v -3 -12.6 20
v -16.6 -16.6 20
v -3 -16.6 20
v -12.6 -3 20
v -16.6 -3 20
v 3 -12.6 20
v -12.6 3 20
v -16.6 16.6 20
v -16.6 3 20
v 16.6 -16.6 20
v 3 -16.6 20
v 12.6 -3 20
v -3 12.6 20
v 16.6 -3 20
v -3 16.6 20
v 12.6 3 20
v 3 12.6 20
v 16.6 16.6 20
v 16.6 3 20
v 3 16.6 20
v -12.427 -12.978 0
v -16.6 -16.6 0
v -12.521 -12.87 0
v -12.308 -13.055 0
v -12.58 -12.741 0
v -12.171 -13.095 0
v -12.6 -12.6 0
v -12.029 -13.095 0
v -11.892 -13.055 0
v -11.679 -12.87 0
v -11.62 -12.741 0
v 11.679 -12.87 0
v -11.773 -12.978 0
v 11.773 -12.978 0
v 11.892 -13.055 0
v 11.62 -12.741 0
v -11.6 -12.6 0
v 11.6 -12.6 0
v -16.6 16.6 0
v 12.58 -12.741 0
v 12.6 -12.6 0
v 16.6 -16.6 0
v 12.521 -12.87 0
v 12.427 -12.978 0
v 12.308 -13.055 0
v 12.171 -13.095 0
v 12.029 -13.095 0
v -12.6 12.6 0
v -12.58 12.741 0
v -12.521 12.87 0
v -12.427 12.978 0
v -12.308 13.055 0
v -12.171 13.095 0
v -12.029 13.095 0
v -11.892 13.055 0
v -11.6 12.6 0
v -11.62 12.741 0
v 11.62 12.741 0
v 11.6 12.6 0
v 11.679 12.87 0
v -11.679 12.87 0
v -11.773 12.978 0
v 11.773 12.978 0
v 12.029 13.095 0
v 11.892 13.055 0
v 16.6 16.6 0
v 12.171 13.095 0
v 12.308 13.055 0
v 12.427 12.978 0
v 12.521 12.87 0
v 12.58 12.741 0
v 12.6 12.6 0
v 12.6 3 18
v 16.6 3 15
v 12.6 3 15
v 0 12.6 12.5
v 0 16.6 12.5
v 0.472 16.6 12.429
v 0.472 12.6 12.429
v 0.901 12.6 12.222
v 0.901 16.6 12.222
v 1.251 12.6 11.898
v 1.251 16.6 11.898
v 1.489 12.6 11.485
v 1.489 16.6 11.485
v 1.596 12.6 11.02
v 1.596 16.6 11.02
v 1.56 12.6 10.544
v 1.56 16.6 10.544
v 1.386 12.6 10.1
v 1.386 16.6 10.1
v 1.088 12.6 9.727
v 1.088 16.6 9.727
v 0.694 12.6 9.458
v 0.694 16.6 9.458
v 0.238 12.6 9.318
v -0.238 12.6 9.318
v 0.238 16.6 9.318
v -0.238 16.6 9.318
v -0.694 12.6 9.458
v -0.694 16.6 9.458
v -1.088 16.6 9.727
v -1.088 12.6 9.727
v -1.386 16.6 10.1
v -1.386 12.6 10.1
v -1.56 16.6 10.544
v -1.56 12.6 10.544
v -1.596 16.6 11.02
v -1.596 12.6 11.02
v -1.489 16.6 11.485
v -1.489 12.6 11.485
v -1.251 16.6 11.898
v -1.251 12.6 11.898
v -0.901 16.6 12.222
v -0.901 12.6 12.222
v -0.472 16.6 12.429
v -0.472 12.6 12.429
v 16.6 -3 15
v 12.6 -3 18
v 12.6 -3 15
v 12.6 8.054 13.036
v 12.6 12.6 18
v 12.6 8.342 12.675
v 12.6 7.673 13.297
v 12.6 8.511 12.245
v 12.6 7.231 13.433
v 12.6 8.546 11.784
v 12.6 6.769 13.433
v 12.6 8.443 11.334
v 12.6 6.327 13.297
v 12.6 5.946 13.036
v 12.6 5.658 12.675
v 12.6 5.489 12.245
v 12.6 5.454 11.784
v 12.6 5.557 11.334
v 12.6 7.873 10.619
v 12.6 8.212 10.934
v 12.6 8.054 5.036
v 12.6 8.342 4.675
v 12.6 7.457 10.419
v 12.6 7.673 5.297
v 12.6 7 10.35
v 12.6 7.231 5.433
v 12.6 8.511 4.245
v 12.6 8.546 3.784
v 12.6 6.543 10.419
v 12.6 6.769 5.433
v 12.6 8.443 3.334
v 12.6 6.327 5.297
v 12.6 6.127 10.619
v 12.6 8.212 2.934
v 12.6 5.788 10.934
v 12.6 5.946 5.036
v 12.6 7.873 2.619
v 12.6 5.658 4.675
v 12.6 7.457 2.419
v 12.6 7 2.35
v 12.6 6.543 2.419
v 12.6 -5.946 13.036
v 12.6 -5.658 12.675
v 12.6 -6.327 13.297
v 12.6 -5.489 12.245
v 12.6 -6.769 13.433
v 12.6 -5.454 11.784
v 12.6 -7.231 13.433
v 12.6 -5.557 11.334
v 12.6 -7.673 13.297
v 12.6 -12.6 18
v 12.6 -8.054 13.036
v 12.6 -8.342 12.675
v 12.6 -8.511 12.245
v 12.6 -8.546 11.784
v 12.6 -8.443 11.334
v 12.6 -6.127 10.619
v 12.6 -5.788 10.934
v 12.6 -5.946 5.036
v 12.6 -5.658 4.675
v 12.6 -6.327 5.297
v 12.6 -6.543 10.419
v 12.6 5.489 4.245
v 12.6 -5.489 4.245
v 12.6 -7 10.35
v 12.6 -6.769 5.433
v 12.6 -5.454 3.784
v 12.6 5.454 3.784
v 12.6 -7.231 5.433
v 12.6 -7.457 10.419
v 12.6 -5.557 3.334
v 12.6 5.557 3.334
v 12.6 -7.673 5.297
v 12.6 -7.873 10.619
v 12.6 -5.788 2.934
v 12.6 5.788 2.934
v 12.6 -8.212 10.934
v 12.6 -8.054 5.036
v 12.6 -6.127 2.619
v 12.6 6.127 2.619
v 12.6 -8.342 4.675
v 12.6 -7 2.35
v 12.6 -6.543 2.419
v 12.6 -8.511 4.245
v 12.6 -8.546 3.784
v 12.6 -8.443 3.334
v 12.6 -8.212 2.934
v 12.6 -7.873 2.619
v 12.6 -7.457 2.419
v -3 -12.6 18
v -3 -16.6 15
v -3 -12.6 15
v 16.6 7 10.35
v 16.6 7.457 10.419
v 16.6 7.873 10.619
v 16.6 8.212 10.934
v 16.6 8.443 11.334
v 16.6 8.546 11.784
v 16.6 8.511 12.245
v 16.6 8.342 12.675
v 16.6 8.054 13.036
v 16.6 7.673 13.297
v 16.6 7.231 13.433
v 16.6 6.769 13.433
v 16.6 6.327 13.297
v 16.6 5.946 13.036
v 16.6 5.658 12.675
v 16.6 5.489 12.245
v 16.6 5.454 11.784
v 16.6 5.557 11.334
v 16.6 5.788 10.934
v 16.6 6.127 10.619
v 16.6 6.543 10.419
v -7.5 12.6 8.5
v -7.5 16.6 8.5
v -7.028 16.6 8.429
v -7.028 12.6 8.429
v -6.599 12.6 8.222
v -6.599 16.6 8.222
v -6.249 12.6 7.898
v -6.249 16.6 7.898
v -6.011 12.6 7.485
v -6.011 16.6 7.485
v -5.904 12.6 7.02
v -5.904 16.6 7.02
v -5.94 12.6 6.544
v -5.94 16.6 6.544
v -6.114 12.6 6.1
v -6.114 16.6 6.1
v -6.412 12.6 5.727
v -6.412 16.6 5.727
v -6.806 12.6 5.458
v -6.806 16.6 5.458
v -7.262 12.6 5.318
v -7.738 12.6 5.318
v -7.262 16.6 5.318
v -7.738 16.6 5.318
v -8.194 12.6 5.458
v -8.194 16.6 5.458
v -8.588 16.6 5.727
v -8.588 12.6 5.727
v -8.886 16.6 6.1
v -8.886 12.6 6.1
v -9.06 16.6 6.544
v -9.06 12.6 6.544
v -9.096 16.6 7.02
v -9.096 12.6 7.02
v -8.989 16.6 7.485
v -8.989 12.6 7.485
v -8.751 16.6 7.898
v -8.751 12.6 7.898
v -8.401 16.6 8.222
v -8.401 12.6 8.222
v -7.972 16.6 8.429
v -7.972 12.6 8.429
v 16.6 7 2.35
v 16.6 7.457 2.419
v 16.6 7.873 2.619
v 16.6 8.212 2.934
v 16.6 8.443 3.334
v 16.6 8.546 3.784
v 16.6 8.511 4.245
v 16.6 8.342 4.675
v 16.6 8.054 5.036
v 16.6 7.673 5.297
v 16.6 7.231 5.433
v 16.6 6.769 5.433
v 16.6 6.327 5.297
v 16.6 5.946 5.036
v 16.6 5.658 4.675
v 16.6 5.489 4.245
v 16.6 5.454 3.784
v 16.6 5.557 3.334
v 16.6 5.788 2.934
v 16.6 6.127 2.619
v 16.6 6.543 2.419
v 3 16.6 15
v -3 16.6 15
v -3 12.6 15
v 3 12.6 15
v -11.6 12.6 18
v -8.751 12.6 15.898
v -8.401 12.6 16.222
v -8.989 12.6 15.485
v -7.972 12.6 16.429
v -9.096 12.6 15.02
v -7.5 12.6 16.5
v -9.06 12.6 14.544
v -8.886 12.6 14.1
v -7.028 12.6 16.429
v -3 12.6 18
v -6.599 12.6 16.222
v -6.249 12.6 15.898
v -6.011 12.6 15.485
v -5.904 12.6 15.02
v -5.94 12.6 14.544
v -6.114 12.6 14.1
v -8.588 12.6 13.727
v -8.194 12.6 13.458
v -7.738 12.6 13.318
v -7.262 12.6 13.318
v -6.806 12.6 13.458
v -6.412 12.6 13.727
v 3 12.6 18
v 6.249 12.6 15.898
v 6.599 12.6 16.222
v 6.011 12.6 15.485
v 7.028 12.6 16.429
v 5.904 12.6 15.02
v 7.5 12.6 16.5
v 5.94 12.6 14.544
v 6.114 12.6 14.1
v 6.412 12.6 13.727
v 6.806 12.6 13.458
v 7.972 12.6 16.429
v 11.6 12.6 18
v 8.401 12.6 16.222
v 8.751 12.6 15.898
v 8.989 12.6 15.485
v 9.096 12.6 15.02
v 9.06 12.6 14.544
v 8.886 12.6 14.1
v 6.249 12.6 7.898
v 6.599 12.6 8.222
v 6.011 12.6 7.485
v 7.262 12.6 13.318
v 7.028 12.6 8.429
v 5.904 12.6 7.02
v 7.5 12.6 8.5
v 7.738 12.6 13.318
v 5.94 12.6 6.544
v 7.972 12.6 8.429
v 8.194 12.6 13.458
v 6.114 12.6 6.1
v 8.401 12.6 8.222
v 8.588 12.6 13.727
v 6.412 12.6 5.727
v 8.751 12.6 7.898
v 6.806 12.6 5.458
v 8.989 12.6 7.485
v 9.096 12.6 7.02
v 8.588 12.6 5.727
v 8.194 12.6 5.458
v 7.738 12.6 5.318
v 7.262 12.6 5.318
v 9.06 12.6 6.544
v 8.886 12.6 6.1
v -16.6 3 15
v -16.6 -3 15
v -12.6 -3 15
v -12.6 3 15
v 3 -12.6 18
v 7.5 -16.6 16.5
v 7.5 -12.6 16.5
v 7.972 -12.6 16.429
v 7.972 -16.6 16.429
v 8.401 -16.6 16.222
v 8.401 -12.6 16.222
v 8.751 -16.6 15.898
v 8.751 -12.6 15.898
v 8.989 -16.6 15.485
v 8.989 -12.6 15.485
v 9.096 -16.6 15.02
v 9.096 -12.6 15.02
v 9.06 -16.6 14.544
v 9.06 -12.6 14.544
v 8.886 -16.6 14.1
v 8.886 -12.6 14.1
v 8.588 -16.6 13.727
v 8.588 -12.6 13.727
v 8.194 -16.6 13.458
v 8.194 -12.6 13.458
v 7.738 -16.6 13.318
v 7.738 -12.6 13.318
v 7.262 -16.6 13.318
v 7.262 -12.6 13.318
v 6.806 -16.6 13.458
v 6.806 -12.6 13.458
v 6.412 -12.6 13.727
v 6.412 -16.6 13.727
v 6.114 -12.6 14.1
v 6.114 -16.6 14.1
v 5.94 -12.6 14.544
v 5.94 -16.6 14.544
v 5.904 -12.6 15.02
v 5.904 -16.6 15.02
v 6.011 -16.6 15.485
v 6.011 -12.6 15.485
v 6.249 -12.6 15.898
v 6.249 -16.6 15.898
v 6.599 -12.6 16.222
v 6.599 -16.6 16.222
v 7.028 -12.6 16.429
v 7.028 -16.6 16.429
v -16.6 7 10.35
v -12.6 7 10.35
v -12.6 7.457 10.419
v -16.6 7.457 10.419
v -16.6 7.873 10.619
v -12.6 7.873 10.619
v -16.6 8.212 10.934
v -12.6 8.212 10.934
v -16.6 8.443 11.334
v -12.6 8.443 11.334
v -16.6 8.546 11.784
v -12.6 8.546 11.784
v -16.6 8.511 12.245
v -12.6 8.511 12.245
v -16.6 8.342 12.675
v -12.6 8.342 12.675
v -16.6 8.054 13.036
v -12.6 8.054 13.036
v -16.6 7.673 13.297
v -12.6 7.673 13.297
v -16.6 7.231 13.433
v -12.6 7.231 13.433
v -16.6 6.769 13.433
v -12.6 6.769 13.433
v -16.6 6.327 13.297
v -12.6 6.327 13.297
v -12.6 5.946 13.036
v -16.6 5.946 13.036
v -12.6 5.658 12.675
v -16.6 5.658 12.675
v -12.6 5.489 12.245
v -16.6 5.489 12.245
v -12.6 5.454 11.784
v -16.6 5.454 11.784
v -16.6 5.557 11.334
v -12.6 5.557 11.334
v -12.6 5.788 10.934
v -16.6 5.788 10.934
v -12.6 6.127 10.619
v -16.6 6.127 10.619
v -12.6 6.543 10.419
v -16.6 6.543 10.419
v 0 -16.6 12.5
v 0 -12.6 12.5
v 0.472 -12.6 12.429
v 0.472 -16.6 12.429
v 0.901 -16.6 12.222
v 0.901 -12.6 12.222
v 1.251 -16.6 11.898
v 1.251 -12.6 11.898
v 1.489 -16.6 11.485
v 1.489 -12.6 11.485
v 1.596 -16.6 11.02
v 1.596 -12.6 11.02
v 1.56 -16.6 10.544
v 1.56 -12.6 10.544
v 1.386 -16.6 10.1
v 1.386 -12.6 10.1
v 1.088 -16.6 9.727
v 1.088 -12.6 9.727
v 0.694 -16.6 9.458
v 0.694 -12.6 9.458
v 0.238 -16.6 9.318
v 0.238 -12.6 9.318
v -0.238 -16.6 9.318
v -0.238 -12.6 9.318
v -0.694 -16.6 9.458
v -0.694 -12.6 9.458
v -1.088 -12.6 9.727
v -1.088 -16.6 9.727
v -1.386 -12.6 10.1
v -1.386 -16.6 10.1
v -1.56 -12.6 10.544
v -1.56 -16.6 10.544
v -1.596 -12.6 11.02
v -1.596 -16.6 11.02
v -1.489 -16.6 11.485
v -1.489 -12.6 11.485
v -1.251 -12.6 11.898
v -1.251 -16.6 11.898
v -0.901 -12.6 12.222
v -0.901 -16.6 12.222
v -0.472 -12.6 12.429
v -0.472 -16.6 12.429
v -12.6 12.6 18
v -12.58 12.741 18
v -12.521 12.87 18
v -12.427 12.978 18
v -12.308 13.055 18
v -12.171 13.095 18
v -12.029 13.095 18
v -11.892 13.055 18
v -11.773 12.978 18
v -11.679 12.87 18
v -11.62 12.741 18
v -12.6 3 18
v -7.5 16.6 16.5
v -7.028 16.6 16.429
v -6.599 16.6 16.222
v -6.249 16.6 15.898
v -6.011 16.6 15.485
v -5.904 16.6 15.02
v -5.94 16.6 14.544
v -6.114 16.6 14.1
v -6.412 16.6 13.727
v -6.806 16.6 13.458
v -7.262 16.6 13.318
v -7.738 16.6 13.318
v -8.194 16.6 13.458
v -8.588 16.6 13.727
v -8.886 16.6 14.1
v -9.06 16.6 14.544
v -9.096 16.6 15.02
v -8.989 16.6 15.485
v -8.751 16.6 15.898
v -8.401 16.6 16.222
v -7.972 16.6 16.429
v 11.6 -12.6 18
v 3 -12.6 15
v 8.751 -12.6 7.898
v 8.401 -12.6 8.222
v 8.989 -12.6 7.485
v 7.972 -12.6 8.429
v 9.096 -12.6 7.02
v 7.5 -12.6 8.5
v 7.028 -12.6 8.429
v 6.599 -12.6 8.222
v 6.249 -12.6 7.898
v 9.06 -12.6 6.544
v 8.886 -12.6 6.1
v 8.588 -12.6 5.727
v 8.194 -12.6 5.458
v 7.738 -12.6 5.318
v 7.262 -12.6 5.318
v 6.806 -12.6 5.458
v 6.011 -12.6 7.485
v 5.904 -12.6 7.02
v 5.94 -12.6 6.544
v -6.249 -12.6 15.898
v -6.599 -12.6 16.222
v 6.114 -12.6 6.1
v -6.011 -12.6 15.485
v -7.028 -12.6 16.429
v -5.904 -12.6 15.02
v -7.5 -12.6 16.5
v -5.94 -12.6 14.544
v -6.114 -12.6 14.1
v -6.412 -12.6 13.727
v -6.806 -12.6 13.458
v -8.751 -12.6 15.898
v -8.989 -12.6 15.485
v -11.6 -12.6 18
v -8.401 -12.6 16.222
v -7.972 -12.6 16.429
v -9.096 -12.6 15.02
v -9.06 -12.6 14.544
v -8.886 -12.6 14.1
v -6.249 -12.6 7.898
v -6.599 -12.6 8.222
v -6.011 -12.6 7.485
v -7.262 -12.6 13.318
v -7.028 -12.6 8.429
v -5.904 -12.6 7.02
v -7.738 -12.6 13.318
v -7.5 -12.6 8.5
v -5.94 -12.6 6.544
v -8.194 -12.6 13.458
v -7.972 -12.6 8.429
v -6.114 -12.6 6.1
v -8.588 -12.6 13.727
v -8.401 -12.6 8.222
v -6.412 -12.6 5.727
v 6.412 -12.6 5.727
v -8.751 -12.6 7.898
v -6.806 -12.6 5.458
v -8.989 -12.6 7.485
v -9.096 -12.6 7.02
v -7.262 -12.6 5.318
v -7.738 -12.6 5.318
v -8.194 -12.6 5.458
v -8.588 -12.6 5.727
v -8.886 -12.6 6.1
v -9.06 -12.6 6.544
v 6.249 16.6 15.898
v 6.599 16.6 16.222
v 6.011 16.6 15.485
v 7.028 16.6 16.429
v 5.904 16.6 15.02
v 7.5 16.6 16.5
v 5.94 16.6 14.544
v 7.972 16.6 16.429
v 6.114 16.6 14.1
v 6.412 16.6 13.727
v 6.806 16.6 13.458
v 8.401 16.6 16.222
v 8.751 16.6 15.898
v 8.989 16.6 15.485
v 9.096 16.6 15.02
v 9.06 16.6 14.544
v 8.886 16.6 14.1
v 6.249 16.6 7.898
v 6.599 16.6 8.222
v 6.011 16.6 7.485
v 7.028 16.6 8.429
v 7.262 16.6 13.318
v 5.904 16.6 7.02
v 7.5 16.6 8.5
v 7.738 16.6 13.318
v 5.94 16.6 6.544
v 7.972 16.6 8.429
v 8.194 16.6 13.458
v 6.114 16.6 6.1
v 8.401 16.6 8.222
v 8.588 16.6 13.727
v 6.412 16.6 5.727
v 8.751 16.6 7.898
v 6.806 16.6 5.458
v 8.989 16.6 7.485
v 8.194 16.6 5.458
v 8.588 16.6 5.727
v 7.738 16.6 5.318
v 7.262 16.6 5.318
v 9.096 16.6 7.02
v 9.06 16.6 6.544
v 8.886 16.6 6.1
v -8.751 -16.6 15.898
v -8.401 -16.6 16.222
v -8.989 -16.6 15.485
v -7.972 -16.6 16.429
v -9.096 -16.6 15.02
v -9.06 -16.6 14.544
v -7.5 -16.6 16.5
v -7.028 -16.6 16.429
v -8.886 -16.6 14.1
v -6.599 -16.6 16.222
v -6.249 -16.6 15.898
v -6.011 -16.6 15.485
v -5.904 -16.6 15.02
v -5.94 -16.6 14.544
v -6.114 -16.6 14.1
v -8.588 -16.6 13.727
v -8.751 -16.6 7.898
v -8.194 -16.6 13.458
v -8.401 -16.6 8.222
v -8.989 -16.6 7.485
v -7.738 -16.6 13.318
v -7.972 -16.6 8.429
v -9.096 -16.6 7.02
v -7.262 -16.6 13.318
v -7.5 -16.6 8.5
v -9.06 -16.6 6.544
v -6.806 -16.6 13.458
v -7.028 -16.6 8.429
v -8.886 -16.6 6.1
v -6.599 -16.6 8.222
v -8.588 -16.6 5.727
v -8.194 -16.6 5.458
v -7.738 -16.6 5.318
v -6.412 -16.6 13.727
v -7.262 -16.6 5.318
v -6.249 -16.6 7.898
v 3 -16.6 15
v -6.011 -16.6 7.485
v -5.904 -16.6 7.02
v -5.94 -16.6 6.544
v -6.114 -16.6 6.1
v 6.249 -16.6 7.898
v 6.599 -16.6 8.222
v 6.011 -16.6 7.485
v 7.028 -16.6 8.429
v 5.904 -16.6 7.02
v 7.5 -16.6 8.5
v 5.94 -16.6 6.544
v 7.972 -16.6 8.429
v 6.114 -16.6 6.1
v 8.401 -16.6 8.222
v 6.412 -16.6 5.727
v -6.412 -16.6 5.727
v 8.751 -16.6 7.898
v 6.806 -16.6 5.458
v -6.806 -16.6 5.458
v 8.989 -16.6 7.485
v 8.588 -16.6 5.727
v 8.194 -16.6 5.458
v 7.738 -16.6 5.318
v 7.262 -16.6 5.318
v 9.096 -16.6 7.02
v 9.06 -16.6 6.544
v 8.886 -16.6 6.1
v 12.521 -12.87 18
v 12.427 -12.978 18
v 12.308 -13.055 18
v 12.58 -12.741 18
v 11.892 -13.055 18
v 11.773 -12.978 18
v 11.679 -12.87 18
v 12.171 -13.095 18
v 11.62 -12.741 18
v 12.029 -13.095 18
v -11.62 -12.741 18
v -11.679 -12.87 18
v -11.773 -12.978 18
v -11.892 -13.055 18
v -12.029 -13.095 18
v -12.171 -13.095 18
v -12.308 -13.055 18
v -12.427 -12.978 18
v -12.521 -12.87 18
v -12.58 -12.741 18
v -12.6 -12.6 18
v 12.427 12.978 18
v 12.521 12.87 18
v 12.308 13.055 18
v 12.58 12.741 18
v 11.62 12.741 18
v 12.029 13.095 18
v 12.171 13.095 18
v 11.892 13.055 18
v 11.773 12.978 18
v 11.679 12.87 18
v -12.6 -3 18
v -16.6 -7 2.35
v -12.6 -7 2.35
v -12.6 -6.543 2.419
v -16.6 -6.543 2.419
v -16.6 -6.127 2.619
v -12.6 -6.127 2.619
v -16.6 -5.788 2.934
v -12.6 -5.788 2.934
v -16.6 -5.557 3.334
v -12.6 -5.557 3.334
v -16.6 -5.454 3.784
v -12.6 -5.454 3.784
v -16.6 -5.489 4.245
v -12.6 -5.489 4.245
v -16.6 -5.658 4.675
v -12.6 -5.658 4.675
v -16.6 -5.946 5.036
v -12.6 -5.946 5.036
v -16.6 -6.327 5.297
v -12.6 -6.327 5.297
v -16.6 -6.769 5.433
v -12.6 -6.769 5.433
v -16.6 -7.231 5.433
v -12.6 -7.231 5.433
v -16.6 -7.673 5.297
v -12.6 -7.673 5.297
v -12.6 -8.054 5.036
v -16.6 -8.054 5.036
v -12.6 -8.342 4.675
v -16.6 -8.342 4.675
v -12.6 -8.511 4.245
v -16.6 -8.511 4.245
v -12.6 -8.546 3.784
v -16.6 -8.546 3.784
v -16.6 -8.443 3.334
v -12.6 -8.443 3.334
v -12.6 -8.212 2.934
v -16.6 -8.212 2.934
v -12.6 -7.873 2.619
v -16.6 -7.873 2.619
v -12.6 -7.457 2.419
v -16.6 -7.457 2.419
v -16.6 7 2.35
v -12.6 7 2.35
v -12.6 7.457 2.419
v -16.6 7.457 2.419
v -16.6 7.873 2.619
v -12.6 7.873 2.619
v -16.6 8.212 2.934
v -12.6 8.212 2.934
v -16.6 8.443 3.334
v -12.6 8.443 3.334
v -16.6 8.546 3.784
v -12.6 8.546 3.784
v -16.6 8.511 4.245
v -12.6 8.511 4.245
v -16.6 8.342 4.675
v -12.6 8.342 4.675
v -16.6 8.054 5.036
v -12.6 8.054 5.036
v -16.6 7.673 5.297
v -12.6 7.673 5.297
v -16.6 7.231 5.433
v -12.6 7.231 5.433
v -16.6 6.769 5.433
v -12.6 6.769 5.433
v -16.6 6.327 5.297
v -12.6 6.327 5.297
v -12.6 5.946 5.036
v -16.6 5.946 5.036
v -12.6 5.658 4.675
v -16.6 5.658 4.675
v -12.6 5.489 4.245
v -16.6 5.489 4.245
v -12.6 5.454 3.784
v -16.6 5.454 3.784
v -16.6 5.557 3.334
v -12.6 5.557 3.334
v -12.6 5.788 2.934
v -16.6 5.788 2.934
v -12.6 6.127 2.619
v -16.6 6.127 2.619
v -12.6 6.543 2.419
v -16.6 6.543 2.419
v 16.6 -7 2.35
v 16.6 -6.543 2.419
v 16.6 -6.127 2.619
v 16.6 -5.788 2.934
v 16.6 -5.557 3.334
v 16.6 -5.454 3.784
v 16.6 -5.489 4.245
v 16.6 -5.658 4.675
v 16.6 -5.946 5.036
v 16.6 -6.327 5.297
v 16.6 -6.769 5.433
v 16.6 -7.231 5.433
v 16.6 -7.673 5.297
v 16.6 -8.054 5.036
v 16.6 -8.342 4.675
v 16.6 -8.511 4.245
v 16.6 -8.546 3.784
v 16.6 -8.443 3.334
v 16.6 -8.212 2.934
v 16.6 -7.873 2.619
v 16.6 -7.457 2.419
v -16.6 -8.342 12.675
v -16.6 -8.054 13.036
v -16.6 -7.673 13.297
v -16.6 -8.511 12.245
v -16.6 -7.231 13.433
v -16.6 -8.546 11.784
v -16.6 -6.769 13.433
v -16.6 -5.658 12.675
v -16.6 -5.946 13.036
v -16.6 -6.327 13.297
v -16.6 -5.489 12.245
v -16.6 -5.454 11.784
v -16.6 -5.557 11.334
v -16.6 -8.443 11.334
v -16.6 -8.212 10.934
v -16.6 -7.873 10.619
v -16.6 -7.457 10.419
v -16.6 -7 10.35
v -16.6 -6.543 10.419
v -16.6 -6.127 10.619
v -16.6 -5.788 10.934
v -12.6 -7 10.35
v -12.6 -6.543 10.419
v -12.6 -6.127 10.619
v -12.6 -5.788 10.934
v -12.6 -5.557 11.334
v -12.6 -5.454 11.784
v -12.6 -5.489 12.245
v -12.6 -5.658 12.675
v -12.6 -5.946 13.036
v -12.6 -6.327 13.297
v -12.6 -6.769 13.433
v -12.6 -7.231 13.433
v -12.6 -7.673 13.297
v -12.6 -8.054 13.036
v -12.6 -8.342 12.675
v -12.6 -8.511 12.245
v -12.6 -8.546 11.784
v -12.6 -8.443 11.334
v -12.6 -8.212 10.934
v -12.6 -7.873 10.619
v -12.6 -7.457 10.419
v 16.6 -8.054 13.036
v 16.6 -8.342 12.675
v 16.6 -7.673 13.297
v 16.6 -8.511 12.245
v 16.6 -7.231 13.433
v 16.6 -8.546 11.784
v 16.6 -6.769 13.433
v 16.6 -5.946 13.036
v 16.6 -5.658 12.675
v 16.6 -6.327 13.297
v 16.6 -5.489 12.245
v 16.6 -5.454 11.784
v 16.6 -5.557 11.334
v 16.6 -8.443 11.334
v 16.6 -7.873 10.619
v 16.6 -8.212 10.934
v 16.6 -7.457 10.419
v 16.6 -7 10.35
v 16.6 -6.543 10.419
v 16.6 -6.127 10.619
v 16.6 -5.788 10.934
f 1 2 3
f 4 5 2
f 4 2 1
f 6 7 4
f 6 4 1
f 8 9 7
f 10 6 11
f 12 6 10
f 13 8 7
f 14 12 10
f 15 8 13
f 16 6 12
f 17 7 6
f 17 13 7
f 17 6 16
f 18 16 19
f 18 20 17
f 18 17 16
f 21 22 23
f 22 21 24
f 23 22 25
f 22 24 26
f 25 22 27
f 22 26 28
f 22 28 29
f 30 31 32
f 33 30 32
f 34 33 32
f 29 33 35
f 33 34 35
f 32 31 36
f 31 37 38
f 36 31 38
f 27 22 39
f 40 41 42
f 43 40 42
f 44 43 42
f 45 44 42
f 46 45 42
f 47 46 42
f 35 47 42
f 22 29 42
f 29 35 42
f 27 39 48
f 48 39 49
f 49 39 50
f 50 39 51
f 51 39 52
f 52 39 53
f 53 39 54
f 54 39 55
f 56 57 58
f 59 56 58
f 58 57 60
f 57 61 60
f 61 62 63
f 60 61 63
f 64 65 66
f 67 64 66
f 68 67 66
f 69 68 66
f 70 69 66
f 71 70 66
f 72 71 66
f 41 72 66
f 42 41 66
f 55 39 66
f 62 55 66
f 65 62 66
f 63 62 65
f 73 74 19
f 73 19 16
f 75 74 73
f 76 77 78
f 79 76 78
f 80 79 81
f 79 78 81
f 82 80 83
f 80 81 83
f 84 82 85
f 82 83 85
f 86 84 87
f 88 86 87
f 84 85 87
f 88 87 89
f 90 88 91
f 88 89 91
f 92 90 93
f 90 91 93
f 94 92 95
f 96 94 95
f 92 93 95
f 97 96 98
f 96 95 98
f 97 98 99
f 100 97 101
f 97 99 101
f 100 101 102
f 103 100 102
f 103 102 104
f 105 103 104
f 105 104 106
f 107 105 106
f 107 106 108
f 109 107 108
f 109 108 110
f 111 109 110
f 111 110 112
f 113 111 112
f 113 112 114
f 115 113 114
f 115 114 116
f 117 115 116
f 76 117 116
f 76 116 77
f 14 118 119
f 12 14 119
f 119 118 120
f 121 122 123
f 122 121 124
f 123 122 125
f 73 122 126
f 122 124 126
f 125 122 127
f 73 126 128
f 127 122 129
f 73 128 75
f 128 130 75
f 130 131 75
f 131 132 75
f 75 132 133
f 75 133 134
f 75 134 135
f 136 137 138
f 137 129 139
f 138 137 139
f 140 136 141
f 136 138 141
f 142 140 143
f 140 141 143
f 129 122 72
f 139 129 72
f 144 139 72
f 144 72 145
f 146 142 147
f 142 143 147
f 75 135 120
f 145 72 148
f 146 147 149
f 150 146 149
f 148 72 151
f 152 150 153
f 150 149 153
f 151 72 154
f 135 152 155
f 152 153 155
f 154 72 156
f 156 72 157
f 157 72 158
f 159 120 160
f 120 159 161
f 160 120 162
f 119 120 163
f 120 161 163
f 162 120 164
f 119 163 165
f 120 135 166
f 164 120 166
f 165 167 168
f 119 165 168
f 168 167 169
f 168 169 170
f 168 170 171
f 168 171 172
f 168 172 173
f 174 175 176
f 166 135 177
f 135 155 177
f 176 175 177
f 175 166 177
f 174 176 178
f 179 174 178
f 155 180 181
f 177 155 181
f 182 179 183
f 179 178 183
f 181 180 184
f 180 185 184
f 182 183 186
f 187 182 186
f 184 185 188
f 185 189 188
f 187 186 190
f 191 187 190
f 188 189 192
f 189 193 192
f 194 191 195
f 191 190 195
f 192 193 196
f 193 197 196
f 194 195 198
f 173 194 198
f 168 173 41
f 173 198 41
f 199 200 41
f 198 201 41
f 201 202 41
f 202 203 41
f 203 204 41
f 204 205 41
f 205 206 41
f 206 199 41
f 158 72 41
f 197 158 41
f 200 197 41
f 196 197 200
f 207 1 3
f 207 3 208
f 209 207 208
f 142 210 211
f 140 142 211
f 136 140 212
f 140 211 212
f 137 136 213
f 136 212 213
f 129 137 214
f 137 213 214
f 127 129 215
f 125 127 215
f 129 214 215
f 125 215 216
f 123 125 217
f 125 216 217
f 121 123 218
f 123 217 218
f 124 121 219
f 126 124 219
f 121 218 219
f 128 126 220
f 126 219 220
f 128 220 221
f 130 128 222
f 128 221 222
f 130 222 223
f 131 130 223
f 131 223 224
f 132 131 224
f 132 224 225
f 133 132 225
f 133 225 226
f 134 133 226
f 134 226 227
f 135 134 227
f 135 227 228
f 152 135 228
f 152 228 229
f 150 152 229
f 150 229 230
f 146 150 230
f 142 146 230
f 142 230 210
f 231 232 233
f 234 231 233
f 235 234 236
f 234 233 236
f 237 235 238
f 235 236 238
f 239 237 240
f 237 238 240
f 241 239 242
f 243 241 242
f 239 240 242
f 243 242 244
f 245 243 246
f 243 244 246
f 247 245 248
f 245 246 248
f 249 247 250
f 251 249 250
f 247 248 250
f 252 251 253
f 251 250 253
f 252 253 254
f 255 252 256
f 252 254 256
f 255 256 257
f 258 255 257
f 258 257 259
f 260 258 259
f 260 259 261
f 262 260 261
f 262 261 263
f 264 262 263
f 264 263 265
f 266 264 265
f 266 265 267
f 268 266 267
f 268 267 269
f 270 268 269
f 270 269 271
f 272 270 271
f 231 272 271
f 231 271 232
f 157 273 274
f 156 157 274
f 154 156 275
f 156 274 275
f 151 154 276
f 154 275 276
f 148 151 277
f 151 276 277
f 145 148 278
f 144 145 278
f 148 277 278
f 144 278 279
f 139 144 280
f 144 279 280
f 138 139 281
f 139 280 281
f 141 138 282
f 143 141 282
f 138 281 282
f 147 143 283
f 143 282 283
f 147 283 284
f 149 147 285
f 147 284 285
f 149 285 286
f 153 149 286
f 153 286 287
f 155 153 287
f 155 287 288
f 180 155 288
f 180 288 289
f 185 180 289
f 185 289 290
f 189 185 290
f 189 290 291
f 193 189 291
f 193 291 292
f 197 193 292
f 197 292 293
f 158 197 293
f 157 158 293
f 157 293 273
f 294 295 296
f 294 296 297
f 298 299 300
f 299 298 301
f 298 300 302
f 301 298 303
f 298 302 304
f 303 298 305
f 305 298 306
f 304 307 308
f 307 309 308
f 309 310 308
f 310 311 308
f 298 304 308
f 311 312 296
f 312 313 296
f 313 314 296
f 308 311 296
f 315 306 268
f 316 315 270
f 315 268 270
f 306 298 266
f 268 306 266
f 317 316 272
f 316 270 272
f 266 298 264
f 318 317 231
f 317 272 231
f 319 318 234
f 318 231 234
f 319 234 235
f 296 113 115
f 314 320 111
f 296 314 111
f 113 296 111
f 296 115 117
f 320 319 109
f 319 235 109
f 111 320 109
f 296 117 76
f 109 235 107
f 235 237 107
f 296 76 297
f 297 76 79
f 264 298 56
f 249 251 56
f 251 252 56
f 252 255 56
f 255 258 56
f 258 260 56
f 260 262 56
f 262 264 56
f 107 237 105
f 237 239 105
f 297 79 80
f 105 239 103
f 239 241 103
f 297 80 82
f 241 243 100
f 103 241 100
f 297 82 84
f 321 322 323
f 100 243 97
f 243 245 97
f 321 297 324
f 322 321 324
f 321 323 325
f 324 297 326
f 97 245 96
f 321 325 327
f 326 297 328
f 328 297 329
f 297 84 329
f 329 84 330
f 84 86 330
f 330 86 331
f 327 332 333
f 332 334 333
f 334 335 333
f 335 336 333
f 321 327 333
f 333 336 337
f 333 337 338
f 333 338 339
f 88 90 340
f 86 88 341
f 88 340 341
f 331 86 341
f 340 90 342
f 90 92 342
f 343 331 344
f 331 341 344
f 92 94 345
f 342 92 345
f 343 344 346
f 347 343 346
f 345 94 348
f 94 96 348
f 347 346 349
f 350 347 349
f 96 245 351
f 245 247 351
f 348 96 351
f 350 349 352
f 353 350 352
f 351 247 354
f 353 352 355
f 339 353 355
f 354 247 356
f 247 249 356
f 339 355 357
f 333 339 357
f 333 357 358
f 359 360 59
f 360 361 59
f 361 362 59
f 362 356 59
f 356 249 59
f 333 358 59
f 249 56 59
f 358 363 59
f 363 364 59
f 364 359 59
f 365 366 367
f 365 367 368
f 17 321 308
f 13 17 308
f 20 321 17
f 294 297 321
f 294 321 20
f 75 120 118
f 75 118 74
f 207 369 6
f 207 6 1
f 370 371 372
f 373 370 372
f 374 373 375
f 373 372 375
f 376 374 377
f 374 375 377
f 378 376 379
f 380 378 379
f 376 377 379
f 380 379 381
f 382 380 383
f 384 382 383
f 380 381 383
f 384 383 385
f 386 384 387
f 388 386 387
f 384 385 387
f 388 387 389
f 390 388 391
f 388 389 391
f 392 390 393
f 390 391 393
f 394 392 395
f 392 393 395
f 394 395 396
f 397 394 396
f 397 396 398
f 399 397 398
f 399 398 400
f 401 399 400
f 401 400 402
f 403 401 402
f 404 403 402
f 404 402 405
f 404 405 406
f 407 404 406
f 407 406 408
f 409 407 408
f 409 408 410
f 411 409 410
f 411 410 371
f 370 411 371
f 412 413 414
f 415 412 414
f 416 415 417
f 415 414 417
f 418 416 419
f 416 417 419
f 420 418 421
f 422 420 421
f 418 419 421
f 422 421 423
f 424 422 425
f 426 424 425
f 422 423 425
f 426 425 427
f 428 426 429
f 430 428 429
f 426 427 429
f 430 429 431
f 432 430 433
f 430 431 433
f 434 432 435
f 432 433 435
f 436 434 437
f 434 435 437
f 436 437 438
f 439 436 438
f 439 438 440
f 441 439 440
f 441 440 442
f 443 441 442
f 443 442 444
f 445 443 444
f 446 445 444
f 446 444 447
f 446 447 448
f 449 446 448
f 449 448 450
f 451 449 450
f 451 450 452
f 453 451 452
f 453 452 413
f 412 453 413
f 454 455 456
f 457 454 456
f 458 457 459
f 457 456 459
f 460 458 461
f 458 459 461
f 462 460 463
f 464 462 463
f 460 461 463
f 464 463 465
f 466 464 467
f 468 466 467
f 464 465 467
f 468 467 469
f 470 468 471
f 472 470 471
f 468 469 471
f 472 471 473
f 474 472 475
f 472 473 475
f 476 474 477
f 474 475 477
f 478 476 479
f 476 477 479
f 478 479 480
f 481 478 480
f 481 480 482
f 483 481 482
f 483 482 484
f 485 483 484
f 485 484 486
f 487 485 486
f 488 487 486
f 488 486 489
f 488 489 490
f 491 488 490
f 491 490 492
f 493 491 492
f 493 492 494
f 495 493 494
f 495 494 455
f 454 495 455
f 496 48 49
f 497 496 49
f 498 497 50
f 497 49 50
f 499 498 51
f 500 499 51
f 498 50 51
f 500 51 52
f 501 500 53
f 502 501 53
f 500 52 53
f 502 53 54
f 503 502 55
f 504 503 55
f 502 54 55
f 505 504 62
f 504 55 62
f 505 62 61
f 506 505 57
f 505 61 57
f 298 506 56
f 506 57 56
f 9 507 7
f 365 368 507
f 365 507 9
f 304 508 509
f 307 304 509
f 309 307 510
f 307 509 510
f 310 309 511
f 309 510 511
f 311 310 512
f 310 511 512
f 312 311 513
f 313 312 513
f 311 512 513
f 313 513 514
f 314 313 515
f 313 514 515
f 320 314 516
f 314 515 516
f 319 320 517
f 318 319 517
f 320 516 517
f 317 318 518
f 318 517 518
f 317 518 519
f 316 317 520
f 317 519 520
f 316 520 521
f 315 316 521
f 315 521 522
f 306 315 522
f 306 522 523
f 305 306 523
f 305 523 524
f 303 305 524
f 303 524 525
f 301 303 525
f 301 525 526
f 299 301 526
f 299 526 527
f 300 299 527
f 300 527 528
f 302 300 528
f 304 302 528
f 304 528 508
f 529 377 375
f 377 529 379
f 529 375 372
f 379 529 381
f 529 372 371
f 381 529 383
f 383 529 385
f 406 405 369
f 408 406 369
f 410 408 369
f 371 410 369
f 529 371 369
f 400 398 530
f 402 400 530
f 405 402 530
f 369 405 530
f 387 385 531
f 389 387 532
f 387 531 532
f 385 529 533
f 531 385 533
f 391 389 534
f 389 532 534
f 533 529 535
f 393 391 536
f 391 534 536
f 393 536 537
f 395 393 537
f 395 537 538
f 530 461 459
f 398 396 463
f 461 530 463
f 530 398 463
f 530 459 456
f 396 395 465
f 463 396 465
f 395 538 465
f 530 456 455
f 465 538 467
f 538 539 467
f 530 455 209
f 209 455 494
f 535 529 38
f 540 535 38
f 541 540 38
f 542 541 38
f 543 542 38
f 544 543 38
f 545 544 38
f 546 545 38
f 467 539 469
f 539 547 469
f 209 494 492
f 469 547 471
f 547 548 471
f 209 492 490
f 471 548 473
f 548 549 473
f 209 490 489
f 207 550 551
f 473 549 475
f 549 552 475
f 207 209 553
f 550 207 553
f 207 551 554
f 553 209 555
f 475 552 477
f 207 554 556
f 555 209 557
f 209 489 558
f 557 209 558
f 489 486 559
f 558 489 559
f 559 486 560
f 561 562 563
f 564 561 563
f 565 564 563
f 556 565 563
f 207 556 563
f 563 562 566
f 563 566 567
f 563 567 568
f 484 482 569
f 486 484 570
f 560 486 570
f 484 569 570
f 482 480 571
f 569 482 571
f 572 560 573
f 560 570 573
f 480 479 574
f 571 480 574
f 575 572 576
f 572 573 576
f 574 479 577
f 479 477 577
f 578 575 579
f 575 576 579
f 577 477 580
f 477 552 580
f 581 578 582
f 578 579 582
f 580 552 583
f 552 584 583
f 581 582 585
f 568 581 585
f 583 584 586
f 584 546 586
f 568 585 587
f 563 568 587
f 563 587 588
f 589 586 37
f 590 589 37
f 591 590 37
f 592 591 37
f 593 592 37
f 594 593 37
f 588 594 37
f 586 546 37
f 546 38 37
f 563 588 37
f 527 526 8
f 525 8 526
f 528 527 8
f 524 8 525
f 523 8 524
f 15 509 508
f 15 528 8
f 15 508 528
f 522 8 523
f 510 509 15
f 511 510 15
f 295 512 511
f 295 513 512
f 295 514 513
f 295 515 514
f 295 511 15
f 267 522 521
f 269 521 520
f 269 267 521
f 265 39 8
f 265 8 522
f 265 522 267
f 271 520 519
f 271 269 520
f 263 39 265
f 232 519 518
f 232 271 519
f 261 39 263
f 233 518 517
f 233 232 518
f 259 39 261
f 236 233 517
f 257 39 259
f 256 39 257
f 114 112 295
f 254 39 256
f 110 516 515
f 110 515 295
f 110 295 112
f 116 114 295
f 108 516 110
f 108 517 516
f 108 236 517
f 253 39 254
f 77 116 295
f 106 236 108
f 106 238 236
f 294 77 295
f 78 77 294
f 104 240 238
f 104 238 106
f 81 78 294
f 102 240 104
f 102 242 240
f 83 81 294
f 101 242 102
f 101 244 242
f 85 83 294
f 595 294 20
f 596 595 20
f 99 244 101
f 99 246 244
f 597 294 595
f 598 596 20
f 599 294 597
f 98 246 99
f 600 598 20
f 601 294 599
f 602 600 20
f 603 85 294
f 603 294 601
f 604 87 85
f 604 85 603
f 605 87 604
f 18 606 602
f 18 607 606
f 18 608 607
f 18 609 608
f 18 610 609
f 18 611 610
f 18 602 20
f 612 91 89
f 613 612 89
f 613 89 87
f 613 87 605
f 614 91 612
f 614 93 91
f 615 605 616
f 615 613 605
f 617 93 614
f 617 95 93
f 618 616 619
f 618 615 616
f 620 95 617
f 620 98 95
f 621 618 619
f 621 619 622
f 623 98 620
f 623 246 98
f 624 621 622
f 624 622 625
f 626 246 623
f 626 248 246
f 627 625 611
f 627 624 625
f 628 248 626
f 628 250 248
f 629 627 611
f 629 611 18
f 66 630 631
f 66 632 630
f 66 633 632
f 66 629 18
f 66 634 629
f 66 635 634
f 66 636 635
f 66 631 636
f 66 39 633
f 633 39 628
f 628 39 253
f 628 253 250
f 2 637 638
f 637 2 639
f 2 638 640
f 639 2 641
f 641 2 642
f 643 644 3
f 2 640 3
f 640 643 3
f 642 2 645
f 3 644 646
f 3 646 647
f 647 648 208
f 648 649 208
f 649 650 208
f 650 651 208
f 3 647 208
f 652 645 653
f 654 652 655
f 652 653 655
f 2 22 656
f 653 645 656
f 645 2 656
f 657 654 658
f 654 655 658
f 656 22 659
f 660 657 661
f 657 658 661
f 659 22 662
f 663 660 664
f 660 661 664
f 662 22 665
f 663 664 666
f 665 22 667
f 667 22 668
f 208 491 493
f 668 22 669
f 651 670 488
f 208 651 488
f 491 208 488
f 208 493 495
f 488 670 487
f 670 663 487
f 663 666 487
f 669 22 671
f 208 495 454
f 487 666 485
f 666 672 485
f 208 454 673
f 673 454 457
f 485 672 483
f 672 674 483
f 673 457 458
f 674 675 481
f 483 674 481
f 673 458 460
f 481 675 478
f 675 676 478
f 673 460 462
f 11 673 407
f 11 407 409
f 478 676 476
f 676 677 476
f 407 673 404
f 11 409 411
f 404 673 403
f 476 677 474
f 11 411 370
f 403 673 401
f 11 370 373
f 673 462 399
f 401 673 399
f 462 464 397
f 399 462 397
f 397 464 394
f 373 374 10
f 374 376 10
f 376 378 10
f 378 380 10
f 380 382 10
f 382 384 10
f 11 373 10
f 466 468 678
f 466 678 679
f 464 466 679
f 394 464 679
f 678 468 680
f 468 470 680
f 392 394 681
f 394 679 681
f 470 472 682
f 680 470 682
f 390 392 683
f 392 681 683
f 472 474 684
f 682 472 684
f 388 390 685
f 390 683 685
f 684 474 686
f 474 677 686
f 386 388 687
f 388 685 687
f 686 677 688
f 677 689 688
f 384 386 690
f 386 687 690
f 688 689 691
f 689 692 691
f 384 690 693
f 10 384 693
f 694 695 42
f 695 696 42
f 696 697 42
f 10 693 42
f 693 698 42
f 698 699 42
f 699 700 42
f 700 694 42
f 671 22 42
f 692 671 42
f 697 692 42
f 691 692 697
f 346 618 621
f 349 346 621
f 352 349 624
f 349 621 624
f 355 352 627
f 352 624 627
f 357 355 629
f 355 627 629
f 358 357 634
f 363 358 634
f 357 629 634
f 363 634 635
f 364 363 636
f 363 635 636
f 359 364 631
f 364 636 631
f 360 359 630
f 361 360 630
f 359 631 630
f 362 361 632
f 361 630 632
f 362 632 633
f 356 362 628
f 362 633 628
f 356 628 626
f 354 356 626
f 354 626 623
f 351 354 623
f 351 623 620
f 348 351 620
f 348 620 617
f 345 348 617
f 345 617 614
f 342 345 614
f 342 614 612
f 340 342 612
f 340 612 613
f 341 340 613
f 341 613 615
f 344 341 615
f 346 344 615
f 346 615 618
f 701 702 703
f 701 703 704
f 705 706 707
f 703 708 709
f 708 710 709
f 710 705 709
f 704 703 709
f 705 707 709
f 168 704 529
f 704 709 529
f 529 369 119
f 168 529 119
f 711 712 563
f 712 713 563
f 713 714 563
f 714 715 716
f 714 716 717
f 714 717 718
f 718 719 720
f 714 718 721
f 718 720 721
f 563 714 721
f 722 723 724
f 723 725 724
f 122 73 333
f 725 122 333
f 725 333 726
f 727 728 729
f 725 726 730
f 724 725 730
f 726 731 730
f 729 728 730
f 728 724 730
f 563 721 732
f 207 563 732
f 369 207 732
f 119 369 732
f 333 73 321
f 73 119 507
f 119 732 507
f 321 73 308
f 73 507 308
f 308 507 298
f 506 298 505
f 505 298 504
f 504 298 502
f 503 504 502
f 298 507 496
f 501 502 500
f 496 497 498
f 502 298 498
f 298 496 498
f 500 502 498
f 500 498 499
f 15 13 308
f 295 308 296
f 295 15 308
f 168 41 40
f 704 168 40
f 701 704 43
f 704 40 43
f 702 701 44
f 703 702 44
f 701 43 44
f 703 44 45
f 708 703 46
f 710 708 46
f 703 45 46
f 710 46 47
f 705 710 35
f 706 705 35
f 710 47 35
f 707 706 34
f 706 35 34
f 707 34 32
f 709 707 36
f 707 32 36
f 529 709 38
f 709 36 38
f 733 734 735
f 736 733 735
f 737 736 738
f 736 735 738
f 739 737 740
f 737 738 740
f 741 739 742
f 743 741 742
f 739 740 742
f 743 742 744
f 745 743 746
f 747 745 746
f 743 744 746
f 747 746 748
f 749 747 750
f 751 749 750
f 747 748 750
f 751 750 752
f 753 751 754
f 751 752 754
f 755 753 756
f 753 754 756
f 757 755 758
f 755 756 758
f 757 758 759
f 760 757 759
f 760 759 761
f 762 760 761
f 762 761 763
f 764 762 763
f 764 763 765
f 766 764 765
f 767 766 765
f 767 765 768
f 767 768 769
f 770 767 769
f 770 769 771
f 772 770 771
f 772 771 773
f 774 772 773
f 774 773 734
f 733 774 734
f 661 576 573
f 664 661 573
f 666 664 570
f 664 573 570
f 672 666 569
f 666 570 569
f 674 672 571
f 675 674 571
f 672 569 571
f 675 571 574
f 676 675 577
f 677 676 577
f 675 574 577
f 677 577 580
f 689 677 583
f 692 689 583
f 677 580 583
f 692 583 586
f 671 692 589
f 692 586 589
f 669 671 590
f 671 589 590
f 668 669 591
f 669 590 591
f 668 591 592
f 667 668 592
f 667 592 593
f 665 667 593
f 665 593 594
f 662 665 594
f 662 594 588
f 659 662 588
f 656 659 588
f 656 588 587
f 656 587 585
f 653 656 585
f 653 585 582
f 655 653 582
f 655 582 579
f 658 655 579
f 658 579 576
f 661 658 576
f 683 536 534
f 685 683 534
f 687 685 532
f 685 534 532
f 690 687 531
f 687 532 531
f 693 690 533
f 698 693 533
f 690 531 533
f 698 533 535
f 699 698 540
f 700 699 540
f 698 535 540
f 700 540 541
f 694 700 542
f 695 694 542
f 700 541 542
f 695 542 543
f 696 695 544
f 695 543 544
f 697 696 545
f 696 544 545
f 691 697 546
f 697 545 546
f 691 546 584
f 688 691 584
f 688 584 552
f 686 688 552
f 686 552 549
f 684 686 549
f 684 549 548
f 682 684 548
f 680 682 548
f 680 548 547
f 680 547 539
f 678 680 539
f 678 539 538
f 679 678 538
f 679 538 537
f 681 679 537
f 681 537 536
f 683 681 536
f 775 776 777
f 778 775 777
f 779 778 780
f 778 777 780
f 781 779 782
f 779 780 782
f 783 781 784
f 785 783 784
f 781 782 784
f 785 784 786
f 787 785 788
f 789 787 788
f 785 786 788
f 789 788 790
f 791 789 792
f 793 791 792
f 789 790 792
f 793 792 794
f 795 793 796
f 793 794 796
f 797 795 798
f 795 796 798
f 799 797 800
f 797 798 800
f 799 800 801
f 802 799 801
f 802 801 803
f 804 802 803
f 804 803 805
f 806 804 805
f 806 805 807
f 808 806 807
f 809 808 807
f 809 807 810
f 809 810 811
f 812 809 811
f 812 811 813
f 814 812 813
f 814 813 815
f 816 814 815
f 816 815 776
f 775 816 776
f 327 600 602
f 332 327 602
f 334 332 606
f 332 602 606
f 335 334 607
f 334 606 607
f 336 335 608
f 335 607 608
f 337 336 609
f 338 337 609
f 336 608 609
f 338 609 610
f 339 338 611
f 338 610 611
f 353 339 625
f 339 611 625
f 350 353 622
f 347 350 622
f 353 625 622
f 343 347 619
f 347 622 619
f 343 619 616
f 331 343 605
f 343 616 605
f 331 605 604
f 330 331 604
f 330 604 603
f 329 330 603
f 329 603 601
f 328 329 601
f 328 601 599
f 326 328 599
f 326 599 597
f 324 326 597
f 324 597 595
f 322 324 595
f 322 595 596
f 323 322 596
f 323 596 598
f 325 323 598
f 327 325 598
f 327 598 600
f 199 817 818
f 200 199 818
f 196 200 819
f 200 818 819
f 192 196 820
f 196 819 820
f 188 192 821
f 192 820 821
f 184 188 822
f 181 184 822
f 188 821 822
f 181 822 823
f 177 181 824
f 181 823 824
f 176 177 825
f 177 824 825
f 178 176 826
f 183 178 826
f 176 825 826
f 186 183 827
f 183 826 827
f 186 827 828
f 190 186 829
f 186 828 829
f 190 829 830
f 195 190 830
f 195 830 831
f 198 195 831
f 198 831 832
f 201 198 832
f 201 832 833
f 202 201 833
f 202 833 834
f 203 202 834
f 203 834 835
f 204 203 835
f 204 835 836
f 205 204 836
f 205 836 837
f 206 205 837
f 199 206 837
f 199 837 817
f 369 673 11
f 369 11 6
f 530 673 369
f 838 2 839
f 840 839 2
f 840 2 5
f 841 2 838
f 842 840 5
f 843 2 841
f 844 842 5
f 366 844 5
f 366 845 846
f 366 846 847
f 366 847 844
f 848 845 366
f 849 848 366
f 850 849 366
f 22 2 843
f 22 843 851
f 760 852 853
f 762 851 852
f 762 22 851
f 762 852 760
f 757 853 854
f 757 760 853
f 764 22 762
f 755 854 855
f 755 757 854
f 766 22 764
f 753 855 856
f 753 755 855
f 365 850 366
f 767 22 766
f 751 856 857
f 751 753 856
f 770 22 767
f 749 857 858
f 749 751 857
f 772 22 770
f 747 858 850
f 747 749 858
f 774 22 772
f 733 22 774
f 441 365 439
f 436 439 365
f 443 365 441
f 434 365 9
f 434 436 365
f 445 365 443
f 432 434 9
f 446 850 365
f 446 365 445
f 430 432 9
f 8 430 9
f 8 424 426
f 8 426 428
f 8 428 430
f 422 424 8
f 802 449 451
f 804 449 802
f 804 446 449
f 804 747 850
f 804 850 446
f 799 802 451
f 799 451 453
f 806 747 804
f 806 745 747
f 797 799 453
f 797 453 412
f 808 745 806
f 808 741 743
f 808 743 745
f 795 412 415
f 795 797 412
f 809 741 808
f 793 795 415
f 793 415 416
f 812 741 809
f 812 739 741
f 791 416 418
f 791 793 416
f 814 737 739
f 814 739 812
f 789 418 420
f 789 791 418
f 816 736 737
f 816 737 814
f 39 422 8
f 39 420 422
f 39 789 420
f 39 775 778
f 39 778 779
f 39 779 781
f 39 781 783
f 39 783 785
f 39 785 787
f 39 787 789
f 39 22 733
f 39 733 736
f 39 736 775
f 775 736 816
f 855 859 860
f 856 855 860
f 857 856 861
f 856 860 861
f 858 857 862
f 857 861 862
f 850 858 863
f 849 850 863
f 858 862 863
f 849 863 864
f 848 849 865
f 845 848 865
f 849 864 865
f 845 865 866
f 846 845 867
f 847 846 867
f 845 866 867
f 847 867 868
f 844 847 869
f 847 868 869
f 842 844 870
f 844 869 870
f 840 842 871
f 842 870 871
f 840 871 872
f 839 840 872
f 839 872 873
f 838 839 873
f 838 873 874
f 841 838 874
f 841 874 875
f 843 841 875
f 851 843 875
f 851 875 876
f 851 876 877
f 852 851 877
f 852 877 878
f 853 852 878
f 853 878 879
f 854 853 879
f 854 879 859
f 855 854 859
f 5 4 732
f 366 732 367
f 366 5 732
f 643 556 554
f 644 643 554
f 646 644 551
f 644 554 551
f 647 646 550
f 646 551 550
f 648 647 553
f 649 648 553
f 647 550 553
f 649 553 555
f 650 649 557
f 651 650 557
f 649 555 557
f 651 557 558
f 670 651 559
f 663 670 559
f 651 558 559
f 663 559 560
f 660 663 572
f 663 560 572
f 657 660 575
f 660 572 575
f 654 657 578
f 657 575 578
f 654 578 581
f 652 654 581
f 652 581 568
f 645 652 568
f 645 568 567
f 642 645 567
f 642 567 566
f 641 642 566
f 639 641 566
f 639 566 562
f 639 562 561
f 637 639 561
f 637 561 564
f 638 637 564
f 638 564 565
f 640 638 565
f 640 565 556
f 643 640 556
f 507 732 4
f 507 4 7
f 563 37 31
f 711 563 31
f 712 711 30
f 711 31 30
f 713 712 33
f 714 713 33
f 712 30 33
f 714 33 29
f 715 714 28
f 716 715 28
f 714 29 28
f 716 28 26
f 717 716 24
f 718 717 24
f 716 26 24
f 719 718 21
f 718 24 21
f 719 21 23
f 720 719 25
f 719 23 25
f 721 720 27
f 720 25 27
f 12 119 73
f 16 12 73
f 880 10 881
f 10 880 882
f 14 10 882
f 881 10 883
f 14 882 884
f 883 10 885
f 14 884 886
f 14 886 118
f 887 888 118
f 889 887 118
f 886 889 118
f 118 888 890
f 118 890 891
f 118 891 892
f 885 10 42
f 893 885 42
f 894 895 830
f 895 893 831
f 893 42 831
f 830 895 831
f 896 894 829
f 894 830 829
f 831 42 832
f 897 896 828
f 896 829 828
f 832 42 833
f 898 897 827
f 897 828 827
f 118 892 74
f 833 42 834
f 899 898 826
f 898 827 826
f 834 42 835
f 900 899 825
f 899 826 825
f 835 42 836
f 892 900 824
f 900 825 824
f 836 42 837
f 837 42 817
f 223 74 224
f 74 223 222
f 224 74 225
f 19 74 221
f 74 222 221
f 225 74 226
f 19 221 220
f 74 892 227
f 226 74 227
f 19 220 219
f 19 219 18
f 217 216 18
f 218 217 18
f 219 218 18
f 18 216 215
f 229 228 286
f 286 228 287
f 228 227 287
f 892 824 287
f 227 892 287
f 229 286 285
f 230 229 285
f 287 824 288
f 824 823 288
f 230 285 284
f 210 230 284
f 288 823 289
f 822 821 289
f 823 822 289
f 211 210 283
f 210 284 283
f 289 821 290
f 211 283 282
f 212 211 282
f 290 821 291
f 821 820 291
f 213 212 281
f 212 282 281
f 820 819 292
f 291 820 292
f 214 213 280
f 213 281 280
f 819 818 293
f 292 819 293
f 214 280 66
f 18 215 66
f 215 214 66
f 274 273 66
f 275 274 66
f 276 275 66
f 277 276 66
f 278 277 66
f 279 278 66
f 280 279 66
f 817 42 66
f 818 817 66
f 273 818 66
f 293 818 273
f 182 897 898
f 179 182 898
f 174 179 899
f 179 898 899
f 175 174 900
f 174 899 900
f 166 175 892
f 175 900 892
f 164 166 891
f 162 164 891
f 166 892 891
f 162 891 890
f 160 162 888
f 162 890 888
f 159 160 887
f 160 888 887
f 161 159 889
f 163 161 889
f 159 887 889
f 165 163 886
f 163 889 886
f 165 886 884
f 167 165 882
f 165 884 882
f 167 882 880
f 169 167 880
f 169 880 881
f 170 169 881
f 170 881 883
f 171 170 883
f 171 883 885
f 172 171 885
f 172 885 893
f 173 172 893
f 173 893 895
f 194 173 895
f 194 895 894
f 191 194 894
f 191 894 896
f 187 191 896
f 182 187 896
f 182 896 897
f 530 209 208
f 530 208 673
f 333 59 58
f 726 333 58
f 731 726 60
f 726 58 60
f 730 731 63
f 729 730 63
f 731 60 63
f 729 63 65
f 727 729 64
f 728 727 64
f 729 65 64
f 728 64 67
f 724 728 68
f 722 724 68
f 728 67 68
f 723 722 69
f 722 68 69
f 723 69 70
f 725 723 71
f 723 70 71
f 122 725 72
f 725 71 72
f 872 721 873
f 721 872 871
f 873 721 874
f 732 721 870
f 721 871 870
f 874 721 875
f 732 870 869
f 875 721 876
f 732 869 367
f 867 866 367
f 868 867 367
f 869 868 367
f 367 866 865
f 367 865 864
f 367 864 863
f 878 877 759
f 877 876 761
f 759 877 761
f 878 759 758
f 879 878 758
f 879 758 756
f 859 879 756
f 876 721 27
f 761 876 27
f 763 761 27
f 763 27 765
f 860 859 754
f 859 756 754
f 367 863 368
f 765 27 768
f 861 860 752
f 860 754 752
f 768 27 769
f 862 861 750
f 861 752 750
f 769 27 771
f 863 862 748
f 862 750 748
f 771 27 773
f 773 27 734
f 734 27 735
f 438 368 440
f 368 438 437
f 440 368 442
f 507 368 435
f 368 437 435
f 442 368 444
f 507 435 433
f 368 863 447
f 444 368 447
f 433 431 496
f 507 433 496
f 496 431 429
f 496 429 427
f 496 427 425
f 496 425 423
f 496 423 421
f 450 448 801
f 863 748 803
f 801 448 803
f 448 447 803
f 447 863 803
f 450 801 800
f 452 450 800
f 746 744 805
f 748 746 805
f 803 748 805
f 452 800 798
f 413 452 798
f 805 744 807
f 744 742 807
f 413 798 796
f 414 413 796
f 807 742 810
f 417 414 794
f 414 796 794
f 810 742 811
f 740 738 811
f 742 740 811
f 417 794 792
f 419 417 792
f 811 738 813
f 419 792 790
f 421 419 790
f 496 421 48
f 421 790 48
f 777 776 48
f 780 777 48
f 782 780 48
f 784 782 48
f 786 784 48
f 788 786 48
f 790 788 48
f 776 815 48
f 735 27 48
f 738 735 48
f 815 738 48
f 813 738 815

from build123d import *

# Parameters (mm, degrees)
SKETCH_1_W               = 33.2
SKETCH_1_H               = 33.2
EXTRUDE_1_DEPTH          = 18
SKETCH_2_W               = 33.2
SKETCH_2_H               = 33.2
EXTRUDE_2_DEPTH          = 2
CUT_EXTRUDE_1_DEPTH      = 40.09219871
CUT_EXTRUDE_1_DEPTH_BACK = 40.09219871
SKETCH_3_W               = 3
SKETCH_3_H               = 6
SKETCH_4_W               = 6
SKETCH_4_H               = 3
CUT_EXTRUDE_2_DEPTH      = 43.163965658
SKETCH_5_W               = 4
SKETCH_5_H               = 6
SKETCH_5_W_2             = 6
SKETCH_5_H_2             = 4
CUT_EXTRUDE_3_DEPTH      = 30.582427216
SKETCH_6_R               = 1.6
CUT_EXTRUDE_4_DEPTH      = 43.163965658
SKETCH_7_R               = 1.55
CUT_EXTRUDE_5_DEPTH      = 43.163965658


with BuildPart() as part:
    # 草图1 → 凸台-拉伸1 (new body)
    with BuildSketch(Plane.XY):
        Rectangle(SKETCH_1_W, SKETCH_1_H)
        with BuildLine():
            Line((11.6, -12.6), (-11.6, -12.6))
            ThreePointArc((-11.6, -12.6), (-12.1, -13.1), (-12.6, -12.6))
            Line((-12.6, -12.6), (-12.6, 12.6))
            ThreePointArc((-12.6, 12.6), (-12.1, 13.1), (-11.6, 12.6))
            Line((-11.6, 12.6), (11.6, 12.6))
            ThreePointArc((11.6, 12.6), (12.1, 13.1), (12.6, 12.6))
            Line((12.6, 12.6), (12.6, -12.6))
            ThreePointArc((12.6, -12.6), (12.1, -13.1), (11.6, -12.6))
        make_face(mode=Mode.SUBTRACT)
    extrude(amount=EXTRUDE_1_DEPTH)

    # 草图2 → 凸台-拉伸2 (add)
    with BuildSketch(Plane.XY.offset(18)):
        Rectangle(SKETCH_2_W, SKETCH_2_H)
    extrude(amount=EXTRUDE_2_DEPTH)

    # 草图3 → 切除-拉伸1 (cut, two sides: drawn at the far end of the back side and taken through both)
    with BuildSketch(Plane(origin=(-12.6, 0, 0), x_dir=(0, 0, -1), z_dir=(1, 0, 0)).offset(-CUT_EXTRUDE_1_DEPTH_BACK)):
        with Locations((-16.5, 0)):
            Rectangle(SKETCH_3_W, SKETCH_3_H)
    extrude(amount=CUT_EXTRUDE_1_DEPTH + CUT_EXTRUDE_1_DEPTH_BACK, mode=Mode.SUBTRACT)

    # 草图4 → 切除-拉伸2 (cut, through all)
    with BuildSketch(Plane(origin=(0, 16.6, 0), x_dir=(1, 0, 0), z_dir=(0, 1, 0))):
        with Locations((0, -16.5)):
            Rectangle(SKETCH_4_W, SKETCH_4_H)
    extrude(amount=-CUT_EXTRUDE_2_DEPTH, mode=Mode.SUBTRACT)

    # 草图5 → 切除-拉伸3 (cut, through all)
    with BuildSketch(Plane(origin=(0, 0, 18), x_dir=(-1, 0, 0), z_dir=(0, 0, -1))):
        with Locations((-14.6, 0)):
            Rectangle(SKETCH_5_W, SKETCH_5_H)
        with Locations((0, -14.6)):
            Rectangle(SKETCH_5_W_2, SKETCH_5_H_2)
        with Locations((14.6, 0)):
            Rectangle(SKETCH_5_W, SKETCH_5_H)
        with Locations((0, 14.6)):
            Rectangle(SKETCH_5_W_2, SKETCH_5_H_2)
    extrude(amount=-CUT_EXTRUDE_3_DEPTH, mode=Mode.SUBTRACT)

    # 草图6 → 切除-拉伸4 (cut, through all)
    with BuildSketch(Plane(origin=(0, 16.6, 0), x_dir=(1, 0, 0), z_dir=(0, 1, 0))):
        with Locations(Location((7.5, -6.9, 0), (0, 0, 270))):
            Circle(SKETCH_6_R)
        with Locations(Location((7.5, -14.9, 0), (0, 0, 270))):
            Circle(SKETCH_6_R)
        with Locations(Location((-7.5, -14.9, 0), (0, 0, 270))):
            Circle(SKETCH_6_R)
        with Locations(Location((-7.5, -6.9, 0), (0, 0, 270))):
            Circle(SKETCH_6_R)
        with Locations(Location((0, -10.9, 0), (0, 0, 270))):
            Circle(SKETCH_6_R)
    extrude(amount=-CUT_EXTRUDE_4_DEPTH, mode=Mode.SUBTRACT)

    # 草图7 → 切除-拉伸5 (cut, through all)
    with BuildSketch(Plane(origin=(16.6, 0, 0), x_dir=(0, 0, -1), z_dir=(1, 0, 0))):
        with Locations((-3.9, -7)):
            Circle(SKETCH_7_R)
        with Locations((-11.9, -7)):
            Circle(SKETCH_7_R)
        with Locations((-11.9, 7)):
            Circle(SKETCH_7_R)
        with Locations((-3.9, 7)):
            Circle(SKETCH_7_R)
    extrude(amount=-CUT_EXTRUDE_5_DEPTH, mode=Mode.SUBTRACT)


solid = part.part
